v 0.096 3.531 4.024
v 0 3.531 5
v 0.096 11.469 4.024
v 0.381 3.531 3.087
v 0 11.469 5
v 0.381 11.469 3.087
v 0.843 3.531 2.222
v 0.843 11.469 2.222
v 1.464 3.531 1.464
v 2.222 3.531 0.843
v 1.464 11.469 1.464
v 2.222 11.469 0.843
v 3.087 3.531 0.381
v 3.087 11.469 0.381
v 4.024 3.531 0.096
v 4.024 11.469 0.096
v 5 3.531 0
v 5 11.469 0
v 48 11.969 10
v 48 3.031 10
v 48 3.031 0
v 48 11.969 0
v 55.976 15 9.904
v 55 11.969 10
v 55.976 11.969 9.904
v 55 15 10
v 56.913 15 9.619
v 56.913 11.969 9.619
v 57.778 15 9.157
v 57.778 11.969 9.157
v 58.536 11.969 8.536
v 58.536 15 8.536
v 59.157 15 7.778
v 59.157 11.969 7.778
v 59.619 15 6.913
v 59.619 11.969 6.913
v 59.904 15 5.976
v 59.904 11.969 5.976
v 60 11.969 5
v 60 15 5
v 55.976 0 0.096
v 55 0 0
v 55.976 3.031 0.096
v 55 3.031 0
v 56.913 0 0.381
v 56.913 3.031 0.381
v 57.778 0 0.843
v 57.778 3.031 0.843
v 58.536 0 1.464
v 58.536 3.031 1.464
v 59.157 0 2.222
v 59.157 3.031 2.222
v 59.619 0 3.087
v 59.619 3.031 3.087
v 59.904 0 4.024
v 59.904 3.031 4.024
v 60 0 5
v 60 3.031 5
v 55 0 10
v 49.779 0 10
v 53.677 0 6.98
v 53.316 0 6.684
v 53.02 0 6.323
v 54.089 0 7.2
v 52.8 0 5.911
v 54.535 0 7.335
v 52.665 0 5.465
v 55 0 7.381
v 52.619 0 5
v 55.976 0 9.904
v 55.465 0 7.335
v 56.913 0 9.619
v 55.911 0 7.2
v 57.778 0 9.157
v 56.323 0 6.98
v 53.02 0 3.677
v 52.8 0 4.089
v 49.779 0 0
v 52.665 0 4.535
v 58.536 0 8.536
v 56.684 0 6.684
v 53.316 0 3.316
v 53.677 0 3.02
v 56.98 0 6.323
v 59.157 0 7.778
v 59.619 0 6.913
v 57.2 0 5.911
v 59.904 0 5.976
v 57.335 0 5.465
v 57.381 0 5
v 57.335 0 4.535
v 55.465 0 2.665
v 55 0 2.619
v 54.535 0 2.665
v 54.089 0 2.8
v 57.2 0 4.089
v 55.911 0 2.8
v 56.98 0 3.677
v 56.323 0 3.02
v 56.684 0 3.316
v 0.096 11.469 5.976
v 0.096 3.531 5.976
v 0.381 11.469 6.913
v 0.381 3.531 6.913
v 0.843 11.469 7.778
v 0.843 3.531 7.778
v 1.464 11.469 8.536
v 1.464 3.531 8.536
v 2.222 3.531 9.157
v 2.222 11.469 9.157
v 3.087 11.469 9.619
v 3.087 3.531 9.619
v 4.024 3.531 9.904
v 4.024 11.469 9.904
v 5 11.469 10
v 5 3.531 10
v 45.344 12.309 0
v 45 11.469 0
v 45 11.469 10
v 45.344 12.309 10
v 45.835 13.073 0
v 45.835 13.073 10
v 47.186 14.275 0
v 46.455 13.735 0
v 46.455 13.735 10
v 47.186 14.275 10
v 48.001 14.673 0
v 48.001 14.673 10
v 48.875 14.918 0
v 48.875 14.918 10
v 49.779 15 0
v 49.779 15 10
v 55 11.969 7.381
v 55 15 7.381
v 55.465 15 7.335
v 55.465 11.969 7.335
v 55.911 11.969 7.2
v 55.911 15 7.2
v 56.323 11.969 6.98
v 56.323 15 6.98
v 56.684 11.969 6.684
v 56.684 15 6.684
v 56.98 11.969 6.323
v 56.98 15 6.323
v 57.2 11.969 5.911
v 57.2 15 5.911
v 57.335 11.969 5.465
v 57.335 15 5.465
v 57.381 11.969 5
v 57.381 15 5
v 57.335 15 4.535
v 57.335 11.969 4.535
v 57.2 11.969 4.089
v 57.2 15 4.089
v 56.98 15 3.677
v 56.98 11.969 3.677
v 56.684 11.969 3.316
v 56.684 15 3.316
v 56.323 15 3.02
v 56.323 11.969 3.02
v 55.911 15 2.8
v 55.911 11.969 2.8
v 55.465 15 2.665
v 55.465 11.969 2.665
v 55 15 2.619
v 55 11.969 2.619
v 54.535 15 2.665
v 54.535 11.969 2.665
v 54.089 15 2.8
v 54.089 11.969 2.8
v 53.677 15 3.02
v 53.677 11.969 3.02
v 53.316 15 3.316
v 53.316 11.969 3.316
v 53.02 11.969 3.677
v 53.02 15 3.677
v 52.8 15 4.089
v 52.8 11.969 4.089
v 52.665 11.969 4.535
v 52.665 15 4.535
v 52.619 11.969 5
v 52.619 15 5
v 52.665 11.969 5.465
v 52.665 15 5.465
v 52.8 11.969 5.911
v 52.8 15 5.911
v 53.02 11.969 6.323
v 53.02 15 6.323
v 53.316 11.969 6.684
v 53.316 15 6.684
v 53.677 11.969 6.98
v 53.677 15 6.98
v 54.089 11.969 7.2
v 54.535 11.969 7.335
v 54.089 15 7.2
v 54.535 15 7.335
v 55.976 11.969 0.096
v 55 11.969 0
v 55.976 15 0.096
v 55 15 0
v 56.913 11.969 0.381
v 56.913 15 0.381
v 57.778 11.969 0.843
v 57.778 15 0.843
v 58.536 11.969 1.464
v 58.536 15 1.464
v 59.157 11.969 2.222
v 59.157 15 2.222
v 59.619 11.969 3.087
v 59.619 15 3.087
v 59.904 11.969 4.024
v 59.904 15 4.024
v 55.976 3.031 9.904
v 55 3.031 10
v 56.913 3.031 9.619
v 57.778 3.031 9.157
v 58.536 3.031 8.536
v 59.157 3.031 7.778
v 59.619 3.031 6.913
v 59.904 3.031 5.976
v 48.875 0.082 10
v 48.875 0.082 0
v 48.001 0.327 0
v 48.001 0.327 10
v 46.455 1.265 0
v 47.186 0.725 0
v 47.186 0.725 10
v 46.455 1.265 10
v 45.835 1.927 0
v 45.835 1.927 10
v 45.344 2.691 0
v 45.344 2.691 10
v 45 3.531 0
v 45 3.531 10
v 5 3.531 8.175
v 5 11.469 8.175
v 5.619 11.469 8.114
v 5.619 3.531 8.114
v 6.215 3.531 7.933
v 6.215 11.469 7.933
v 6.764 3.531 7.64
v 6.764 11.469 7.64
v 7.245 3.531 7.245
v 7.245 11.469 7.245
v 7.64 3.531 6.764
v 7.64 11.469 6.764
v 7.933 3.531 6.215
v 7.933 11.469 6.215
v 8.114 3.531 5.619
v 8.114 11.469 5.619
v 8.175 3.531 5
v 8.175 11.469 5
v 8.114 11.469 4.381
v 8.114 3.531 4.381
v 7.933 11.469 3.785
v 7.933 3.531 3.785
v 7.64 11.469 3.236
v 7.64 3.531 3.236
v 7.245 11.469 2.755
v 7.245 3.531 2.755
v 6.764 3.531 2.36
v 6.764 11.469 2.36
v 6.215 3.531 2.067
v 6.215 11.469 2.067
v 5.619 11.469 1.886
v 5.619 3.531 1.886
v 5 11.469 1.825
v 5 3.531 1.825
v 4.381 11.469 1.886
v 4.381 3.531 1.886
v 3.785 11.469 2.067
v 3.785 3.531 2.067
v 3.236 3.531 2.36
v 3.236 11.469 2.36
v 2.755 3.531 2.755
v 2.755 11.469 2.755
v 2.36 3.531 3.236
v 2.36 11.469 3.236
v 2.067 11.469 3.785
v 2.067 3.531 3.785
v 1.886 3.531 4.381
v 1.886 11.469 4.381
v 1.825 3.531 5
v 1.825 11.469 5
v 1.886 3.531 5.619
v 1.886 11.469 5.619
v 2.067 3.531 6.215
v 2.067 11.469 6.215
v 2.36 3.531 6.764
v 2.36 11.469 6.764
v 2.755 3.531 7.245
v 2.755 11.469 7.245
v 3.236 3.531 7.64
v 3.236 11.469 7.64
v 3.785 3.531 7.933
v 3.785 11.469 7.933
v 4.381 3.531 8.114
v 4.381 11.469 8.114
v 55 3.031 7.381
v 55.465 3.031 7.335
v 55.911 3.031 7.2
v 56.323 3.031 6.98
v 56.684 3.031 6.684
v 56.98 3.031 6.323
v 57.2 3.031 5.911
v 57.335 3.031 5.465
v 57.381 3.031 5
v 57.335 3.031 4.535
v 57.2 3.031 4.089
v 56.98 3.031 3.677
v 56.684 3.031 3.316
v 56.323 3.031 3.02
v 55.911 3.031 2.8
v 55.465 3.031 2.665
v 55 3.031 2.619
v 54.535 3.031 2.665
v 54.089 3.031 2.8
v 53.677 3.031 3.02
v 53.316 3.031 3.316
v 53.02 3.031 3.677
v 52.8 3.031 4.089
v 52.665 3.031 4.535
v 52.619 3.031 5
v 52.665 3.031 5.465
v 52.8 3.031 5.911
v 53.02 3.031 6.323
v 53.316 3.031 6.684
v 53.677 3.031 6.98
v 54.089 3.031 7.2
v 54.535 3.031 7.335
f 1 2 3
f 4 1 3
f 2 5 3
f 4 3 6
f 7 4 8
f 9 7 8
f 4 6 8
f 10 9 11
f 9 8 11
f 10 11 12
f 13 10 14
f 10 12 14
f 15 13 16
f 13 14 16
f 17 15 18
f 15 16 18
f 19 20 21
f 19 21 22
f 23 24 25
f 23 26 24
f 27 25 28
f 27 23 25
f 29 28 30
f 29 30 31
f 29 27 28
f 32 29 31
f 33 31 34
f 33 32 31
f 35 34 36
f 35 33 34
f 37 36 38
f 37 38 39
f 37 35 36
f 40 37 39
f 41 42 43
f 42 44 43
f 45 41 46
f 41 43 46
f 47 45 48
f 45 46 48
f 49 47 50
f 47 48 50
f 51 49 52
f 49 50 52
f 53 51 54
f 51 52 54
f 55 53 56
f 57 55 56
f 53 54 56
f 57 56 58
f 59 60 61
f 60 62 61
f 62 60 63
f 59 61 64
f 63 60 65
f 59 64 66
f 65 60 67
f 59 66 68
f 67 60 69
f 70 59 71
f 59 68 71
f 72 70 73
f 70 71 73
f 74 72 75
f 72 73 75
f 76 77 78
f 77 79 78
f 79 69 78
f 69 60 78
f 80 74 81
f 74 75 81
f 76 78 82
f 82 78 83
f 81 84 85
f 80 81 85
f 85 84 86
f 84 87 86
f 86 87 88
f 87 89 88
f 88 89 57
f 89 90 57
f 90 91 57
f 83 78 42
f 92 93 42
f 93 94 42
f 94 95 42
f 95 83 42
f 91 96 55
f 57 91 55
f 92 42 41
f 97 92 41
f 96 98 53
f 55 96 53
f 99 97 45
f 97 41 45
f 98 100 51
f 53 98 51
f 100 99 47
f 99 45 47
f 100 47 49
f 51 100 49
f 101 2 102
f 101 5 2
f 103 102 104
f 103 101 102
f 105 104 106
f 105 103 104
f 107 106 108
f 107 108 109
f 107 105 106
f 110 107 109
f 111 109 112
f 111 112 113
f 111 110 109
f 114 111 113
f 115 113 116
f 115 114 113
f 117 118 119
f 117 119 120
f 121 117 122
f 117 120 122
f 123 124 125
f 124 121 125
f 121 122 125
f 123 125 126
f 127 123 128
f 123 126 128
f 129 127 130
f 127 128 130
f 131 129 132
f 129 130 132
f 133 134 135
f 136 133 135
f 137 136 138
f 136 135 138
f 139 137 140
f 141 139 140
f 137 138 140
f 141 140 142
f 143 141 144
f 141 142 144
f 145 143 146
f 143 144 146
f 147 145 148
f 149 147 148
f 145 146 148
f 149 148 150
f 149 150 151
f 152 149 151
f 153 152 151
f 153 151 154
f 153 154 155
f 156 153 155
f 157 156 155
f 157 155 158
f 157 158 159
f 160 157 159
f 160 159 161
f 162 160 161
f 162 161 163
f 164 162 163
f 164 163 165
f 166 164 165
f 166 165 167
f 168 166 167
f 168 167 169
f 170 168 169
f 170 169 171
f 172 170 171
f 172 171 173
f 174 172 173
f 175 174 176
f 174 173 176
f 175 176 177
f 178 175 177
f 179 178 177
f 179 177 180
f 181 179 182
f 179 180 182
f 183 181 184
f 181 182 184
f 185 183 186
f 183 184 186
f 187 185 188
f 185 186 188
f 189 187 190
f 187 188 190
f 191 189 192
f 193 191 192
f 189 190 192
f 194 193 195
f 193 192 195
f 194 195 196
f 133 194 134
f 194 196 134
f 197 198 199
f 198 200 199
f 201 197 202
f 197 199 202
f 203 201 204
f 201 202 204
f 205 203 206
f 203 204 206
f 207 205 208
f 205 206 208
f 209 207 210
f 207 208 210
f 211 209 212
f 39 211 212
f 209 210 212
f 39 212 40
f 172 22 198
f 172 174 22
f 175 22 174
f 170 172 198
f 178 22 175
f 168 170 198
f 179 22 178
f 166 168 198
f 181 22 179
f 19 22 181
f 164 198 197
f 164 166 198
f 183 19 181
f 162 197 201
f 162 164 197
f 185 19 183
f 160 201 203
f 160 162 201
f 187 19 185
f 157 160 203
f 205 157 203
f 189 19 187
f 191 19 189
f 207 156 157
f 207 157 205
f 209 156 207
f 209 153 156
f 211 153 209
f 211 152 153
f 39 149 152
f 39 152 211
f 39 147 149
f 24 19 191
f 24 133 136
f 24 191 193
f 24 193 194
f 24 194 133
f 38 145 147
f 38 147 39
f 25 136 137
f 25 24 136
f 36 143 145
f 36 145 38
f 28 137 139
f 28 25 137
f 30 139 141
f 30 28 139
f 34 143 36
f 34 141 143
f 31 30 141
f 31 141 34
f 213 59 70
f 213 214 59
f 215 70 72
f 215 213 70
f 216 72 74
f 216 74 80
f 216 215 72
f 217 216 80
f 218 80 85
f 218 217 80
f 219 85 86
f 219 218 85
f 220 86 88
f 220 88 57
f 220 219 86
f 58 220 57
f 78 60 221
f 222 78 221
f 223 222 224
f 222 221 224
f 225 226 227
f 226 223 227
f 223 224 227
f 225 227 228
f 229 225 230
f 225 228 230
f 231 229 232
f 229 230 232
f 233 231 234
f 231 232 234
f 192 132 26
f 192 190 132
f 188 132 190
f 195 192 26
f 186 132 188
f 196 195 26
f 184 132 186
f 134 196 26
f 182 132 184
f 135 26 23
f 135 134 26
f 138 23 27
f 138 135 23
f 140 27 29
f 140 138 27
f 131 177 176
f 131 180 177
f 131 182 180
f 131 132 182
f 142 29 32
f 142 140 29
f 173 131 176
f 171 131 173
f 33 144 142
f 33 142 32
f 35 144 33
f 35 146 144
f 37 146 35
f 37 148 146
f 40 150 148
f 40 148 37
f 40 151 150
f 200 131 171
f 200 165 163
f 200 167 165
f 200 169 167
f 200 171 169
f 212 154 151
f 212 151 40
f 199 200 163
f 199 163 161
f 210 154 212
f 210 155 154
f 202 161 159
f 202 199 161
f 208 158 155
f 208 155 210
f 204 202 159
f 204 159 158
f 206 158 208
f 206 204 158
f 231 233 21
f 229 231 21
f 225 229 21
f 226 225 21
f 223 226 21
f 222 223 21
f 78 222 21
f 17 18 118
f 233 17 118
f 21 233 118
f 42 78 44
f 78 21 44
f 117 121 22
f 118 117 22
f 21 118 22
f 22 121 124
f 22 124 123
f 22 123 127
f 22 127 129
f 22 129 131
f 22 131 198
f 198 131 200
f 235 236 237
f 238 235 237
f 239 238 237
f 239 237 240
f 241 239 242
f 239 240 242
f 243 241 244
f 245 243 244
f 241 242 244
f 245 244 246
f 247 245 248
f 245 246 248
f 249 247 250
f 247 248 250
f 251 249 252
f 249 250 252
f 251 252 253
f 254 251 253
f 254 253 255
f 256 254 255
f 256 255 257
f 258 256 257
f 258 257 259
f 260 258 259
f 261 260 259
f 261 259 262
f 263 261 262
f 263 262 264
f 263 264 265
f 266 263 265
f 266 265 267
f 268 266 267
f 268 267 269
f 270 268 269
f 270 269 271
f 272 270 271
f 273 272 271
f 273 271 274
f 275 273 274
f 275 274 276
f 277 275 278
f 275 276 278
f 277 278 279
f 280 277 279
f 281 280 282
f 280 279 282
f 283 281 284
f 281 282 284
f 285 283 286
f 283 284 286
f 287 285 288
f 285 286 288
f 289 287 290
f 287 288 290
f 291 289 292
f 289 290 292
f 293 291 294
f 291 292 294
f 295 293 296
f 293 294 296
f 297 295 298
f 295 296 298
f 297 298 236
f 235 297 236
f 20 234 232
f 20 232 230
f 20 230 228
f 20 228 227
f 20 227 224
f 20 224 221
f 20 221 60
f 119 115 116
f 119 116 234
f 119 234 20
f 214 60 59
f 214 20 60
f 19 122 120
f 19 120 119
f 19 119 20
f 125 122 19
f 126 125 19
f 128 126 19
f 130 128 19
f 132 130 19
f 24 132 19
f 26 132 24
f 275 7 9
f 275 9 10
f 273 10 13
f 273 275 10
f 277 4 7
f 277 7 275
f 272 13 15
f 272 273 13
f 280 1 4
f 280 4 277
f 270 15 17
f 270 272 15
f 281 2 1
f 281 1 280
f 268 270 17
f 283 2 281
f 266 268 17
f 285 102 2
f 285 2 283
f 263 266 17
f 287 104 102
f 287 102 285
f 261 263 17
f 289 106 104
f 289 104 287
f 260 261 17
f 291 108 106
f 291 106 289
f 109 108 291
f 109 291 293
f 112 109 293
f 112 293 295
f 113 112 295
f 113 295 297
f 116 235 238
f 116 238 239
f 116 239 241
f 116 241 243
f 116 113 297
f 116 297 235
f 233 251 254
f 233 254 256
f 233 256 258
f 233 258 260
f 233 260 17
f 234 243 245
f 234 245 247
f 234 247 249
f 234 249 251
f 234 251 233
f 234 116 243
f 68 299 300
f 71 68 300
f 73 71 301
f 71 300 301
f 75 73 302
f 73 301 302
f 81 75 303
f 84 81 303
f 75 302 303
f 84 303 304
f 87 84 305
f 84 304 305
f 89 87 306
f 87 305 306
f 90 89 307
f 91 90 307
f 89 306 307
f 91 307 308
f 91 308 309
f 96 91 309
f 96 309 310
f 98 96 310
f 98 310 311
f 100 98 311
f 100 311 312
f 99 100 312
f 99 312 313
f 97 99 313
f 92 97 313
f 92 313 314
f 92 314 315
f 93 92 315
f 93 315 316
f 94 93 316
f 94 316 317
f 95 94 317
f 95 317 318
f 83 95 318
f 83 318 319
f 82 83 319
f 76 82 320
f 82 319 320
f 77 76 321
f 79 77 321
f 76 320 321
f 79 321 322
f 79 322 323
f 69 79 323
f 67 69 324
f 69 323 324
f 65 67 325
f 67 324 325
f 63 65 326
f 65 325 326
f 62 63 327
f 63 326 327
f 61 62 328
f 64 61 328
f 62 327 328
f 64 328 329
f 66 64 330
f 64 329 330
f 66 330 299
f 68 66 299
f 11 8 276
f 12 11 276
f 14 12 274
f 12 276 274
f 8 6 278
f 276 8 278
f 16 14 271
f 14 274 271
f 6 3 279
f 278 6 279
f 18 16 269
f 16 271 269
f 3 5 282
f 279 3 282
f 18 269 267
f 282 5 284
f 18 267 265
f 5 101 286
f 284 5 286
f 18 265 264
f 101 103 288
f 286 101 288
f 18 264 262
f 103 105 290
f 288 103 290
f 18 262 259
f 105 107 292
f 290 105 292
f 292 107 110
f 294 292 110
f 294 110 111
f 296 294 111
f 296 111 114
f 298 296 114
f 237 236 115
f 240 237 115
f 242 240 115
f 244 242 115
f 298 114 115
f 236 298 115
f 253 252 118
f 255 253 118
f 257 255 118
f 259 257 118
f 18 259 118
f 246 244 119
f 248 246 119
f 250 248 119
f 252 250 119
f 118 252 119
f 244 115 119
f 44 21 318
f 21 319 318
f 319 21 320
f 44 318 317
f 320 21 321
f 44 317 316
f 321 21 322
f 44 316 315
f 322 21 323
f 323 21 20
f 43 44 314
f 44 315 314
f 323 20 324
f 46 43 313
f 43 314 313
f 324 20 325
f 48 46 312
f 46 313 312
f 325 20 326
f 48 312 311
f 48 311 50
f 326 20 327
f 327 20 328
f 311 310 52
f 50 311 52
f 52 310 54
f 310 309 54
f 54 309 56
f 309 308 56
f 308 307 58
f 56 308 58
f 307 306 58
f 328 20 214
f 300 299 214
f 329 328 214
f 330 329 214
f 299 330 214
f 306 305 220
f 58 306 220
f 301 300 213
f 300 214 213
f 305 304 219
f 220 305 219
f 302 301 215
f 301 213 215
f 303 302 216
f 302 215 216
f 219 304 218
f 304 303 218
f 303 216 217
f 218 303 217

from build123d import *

# Parameters (mm, degrees)
SKETCH1_W           = 60
SKETCH1_H           = 15
BOSS_EXTRUDE1_DEPTH = 10
SKETCH2_W           = 12
SKETCH2_H           = 8.9375
CUT_EXTRUDE1_DEPTH  = 63.649820431
SKETCH4_W           = 45
SKETCH4_H           = 3.53125
CUT_EXTRUDE3_DEPTH  = 63.649820431
FILLET1_R           = 5
FILLET2_R           = 5
SKETCH3_R           = 3.175
SKETCH3_R_2         = 2.38125
CUT_EXTRUDE2_DEPTH  = 63.649820431


# Some blends are built 0.0001 mm under size
with BuildPart() as part:
    # Sketch1 → Boss-Extrude1 (new body)
    with BuildSketch(Plane.XY):
        with Locations((30, 7.5)):
            Rectangle(SKETCH1_W, SKETCH1_H)
    extrude(amount=BOSS_EXTRUDE1_DEPTH)

    # Sketch2 → Cut-Extrude1 (cut, through all)
    with BuildSketch(Plane.XY.offset(10)):
        with Locations((54, 7.5)):
            Rectangle(SKETCH2_W, SKETCH2_H)
    extrude(amount=-CUT_EXTRUDE1_DEPTH, mode=Mode.SUBTRACT)

    # Sketch4 → Cut-Extrude3 (cut, through all)
    with BuildSketch(Plane.XY.offset(10)):
        with Locations((22.5, 13.234375)):
            Rectangle(SKETCH4_W, SKETCH4_H)
        with Locations((22.5, 1.765625)):
            Rectangle(SKETCH4_W, SKETCH4_H)
    extrude(amount=-CUT_EXTRUDE3_DEPTH, mode=Mode.SUBTRACT)

    # Fillet1
    fillet1_edges = [part.edges().sort_by_distance(p)[0] for p in [
        (60, 1.515625, 0),
        (60, 1.515625, 10),
        (60, 13.484375, 0),
        (60, 13.484375, 10),
        (0, 7.5, 0),
        (0, 7.5, 10),
    ]]
    fillet(fillet1_edges, radius=FILLET1_R - 0.0001)  # a hair under: the kernel refuses the full size

    # Fillet2
    # the kernel refuses this fillet: 5 mm, written as the material it takes off along each edge
    with BuildSketch(Plane(origin=(45, 0, 21.948528528), x_dir=(1, 0, 0), z_dir=(0, 0, -1))) as fillet2_piece_1:
        with BuildLine():
            CenterArc((4.779411411, -5), FILLET2_R, 90, 72.917402966)
            Line((0, -3.53125), (-0.095588228, -3.501875))
            ThreePointArc((-0.095588228, -3.501875), (-0.1, -1.765625), (-0.1, 0))
            Line((-0.1, 0), (0, 0.1))
            Line((0, 0.1), (4.779411411, 0.1))
            Line((4.779411411, 0.1), (4.779411411, 0))
        make_face()
    extrude(amount=33.897057056, mode=Mode.SUBTRACT)
    with BuildSketch(Plane(origin=(45, 15, 21.948528528), x_dir=(0, -1, 0), z_dir=(0, 0, -1))) as fillet2_piece_2:
        with BuildLine():
            CenterArc((5, -4.779411411), FILLET2_R, 107.082597034, 72.917402966)
            Line((0, -4.779411411), (-0.1, -4.779411411))
            Line((-0.1, -4.779411411), (-0.1, 0))
            Line((-0.1, 0), (0, 0.1))
            ThreePointArc((0, 0.1), (1.765625, 0.1), (3.501875, 0.095588228))
            Line((3.501875, 0.095588228), (3.53125, 0))
        make_face()
    extrude(amount=33.897057056, mode=Mode.SUBTRACT)

    # Sketch3 → Cut-Extrude2 (cut, through all)
    with BuildSketch(Plane(origin=(0, 15, 0), x_dir=(1, 0, 0), z_dir=(0, 1, 0))):
        with Locations(Location((5, -5, 0), (0, 0, 270))):
            Circle(SKETCH3_R)
        with Locations(Location((55, -5, 0), (0, 0, 270))):
            Circle(SKETCH3_R_2)
    extrude(amount=-CUT_EXTRUDE2_DEPTH, mode=Mode.SUBTRACT)


solid = part.part
